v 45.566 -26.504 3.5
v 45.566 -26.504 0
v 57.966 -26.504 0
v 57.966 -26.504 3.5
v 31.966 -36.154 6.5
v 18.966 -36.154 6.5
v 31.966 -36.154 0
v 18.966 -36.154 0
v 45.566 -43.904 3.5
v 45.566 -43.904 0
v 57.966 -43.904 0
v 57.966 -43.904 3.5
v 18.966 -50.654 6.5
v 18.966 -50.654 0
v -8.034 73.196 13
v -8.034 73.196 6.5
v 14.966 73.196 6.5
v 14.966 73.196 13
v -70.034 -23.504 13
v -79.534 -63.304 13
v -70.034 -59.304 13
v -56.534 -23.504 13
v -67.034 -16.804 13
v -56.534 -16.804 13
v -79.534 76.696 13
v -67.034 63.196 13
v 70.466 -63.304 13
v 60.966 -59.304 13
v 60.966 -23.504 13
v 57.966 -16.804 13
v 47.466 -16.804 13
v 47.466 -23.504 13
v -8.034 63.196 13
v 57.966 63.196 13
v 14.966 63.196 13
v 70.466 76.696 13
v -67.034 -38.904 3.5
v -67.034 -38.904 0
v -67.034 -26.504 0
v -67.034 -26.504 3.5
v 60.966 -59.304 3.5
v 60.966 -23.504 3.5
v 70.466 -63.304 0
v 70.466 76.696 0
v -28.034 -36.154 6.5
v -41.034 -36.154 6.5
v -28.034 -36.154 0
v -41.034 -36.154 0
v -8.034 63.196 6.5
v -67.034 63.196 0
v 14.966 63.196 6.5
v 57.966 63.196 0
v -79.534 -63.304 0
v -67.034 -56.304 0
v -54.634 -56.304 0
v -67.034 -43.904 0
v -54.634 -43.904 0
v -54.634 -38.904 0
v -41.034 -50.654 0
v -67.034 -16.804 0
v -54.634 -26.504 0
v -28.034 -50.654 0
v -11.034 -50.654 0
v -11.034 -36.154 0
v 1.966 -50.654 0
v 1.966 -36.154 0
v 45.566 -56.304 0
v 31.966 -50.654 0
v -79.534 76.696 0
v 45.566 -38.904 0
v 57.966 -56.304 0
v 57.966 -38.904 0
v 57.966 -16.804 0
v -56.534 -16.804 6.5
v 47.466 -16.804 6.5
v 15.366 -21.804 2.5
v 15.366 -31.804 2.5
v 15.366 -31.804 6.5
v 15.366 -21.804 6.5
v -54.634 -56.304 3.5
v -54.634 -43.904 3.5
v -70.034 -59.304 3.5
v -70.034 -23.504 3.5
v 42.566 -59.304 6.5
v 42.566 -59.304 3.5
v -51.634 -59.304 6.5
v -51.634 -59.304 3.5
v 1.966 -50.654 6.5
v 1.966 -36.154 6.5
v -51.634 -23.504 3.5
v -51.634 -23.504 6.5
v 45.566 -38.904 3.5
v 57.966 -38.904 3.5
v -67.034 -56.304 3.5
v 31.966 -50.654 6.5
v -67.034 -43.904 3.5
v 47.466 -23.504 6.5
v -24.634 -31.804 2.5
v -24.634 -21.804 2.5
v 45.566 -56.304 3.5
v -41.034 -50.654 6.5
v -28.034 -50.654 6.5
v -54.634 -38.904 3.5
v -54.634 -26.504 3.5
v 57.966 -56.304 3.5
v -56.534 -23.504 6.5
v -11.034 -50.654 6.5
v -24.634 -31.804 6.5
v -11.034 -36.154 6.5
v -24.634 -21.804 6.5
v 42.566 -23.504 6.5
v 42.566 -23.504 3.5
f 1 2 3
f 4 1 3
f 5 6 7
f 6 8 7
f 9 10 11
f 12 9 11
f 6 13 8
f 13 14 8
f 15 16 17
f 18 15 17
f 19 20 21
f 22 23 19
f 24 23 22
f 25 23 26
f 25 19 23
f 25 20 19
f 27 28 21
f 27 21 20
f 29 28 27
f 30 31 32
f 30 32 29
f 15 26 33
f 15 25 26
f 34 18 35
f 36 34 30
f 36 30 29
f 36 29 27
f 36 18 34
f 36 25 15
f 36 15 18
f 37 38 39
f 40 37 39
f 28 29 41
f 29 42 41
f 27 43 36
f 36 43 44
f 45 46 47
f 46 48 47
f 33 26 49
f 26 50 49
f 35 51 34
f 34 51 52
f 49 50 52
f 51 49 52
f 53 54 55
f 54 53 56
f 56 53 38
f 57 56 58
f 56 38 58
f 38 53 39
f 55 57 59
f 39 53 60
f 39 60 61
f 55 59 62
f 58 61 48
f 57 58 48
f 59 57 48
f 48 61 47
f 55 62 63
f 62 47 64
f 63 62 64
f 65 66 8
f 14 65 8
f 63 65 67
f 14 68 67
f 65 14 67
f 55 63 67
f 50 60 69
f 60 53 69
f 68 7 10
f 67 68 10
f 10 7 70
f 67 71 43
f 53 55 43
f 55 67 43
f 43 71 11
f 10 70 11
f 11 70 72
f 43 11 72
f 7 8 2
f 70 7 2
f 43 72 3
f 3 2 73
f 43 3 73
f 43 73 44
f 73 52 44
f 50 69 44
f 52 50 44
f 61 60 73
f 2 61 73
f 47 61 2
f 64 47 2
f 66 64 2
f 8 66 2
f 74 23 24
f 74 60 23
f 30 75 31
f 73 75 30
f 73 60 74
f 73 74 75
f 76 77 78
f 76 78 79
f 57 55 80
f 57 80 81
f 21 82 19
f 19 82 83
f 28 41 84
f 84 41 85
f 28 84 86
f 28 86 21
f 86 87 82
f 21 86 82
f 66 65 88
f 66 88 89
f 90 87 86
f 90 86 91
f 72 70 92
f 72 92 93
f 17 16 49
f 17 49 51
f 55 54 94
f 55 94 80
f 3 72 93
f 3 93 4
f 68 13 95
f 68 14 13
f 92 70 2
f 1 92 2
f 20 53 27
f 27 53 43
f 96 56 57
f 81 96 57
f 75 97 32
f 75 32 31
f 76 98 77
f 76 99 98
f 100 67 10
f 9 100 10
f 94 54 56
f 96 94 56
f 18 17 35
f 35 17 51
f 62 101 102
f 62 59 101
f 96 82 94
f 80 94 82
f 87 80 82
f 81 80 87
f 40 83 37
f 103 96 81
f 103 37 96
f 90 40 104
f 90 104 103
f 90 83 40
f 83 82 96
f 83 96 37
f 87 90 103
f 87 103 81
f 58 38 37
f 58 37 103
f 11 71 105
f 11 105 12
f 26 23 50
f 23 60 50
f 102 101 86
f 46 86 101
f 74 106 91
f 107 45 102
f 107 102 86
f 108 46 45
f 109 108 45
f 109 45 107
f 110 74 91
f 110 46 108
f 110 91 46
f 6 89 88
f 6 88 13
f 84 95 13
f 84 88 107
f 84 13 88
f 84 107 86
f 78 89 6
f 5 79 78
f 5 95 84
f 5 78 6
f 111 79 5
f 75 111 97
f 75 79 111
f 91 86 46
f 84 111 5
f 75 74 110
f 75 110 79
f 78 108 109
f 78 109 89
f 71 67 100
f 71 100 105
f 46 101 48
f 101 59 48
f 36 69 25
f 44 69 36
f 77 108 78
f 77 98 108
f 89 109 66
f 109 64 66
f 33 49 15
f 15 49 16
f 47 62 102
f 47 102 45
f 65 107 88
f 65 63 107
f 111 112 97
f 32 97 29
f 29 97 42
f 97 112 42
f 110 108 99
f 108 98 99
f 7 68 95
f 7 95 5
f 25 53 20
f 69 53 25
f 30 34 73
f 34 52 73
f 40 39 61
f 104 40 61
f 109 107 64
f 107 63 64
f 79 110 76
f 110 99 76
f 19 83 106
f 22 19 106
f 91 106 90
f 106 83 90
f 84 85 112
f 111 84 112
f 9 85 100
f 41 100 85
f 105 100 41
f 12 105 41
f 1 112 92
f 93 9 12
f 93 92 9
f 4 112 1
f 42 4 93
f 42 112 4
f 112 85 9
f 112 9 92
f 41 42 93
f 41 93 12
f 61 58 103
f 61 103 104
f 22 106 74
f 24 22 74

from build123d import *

# Parameters (mm, degrees)
F0_W     = 150
F0_H     = 140
F0_W_2   = 18.4
F0_H_2   = 35.8
F0_W_3   = 13
F0_H_3   = 14.5
F0_W_4   = 40
F0_H_4   = 10
F0_W_5   = 22.4
F0_W_6   = 125
F0_H_5   = 80
F0_W_7   = 12.4
F0_H_6   = 12.4
F1_DEPTH = 2.5
F2_DEPTH = 3.5
F3_W     = 150
F3_H     = 140
F3_W_2   = 18.4
F3_H_2   = 35.8
F3_W_3   = 13
F3_H_3   = 14.5
F3_W_4   = 40
F3_H_4   = 10
F3_W_5   = 125
F3_H_5   = 80
F4_DEPTH = 3
F5_W     = 150
F5_H     = 140
F5_W_2   = 10.5
F5_H_2   = 6.7
F6_DEPTH = 6.5


with BuildPart() as f1:
    # F0 (on Top) → F1 (new body)
    with BuildSketch(Plane.XY):
        with Locations((-4.5338094234, 6.6955923945)):
            Rectangle(F0_W, F0_H)
        with Locations((-60.8338094234, -41.4044076055)):
            Rectangle(F0_W_2, F0_H_2, mode=Mode.SUBTRACT)
        with Locations((-34.5338094234, -43.4044076055)):
            Rectangle(F0_W_3, F0_H_3, mode=Mode.SUBTRACT)
        with Locations((-4.6338094234, -26.8044076055)):
            Rectangle(F0_W_4, F0_H_4, mode=Mode.SUBTRACT)
        with Locations((-4.5338094234, -43.4044076055)):
            Rectangle(F0_W_3, F0_H_3, mode=Mode.SUBTRACT)
        with Locations((25.4661905766, -43.4044076055)):
            Rectangle(F0_W_3, F0_H_3, mode=Mode.SUBTRACT)
        with Locations((51.7661905766, -41.4044076055)):
            Rectangle(F0_W_5, F0_H_2, mode=Mode.SUBTRACT)
        with Locations((-4.5338094234, 23.1955923945)):
            Rectangle(F0_W_6, F0_H_5, mode=Mode.SUBTRACT)
        with Locations((-60.8338094234, -41.4044076055)):
            Rectangle(F0_W_2, F0_H_2)
        with Locations((-60.8338094234, -50.1044076055)):
            Rectangle(F0_W_7, F0_H_6, mode=Mode.SUBTRACT)
        with Locations((-60.8338094234, -32.7044076055)):
            Rectangle(F0_W_7, F0_H_6, mode=Mode.SUBTRACT)
        with Locations((51.7661905766, -41.4044076055)):
            Rectangle(F0_W_5, F0_H_2)
        with Locations((51.7661905766, -50.1044076055)):
            Rectangle(F0_W_7, F0_H_6, mode=Mode.SUBTRACT)
        with Locations((51.7661905766, -32.7044076055)):
            Rectangle(F0_W_7, F0_H_6, mode=Mode.SUBTRACT)
        with Locations((-4.6338094234, -26.8044076055)):
            Rectangle(F0_W_4, F0_H_4)
    extrude(amount=F1_DEPTH)

    # F0 (on Top) → F2 (join)
    with BuildSketch(Plane.XY):
        with Locations((-4.5338094234, 6.6955923945)):
            Rectangle(F0_W, F0_H)
        with Locations((-60.8338094234, -41.4044076055)):
            Rectangle(F0_W_2, F0_H_2, mode=Mode.SUBTRACT)
        with Locations((-34.5338094234, -43.4044076055)):
            Rectangle(F0_W_3, F0_H_3, mode=Mode.SUBTRACT)
        with Locations((-4.6338094234, -26.8044076055)):
            Rectangle(F0_W_4, F0_H_4, mode=Mode.SUBTRACT)
        with Locations((-4.5338094234, -43.4044076055)):
            Rectangle(F0_W_3, F0_H_3, mode=Mode.SUBTRACT)
        with Locations((25.4661905766, -43.4044076055)):
            Rectangle(F0_W_3, F0_H_3, mode=Mode.SUBTRACT)
        with Locations((51.7661905766, -41.4044076055)):
            Rectangle(F0_W_5, F0_H_2, mode=Mode.SUBTRACT)
        with Locations((-4.5338094234, 23.1955923945)):
            Rectangle(F0_W_6, F0_H_5, mode=Mode.SUBTRACT)
        with Locations((-60.8338094234, -41.4044076055)):
            Rectangle(F0_W_2, F0_H_2)
        with Locations((-60.8338094234, -50.1044076055)):
            Rectangle(F0_W_7, F0_H_6, mode=Mode.SUBTRACT)
        with Locations((-60.8338094234, -32.7044076055)):
            Rectangle(F0_W_7, F0_H_6, mode=Mode.SUBTRACT)
        with Locations((51.7661905766, -41.4044076055)):
            Rectangle(F0_W_5, F0_H_2)
        with Locations((51.7661905766, -50.1044076055)):
            Rectangle(F0_W_7, F0_H_6, mode=Mode.SUBTRACT)
        with Locations((51.7661905766, -32.7044076055)):
            Rectangle(F0_W_7, F0_H_6, mode=Mode.SUBTRACT)
    extrude(amount=F2_DEPTH)

    # F3 (on face) → F4 (join)
    with BuildSketch(Plane.XY.offset(3.5)):
        with Locations((-4.5338094234, 6.6955923945)):
            Rectangle(F3_W, F3_H)
        with Locations((-60.8338094234, -41.4044076055)):
            Rectangle(F3_W_2, F3_H_2, mode=Mode.SUBTRACT)
        with Locations((-34.5338094234, -43.4044076055)):
            Rectangle(F3_W_3, F3_H_3, mode=Mode.SUBTRACT)
        with Locations((-4.6338094234, -26.8044076055)):
            Rectangle(F3_W_4, F3_H_4, mode=Mode.SUBTRACT)
        with Locations((-4.5338094234, -43.4044076055)):
            Rectangle(F3_W_3, F3_H_3, mode=Mode.SUBTRACT)
        with Locations((25.4661905766, -43.4044076055)):
            Rectangle(F3_W_3, F3_H_3, mode=Mode.SUBTRACT)
        with Locations((51.7661905766, -41.4044076055)):
            Rectangle(F3_W_2, F3_H_2, mode=Mode.SUBTRACT)
        with Locations((-4.5338094234, 23.1955923945)):
            Rectangle(F3_W_5, F3_H_5, mode=Mode.SUBTRACT)
    extrude(amount=F4_DEPTH)

    # F5 (on face) → F6 (join)
    with BuildSketch(Plane.XY.offset(6.5)):
        with Locations((-4.5338094234, 6.6955923945)):
            Rectangle(F5_W, F5_H)
        Polygon((-67.0338094234, -23.5044076055), (-67.0338094234, -16.8044076055), (-67.0338094234, 63.1955923945), (-8.0338094234, 63.1955923945), (-8.0338094234, 73.1955923945), (14.9661905766, 73.1955923945), (14.9661905766, 63.1955923945), (57.9661905766, 63.1955923945), (57.9661905766, -16.8044076055), (57.9661905766, -23.5044076055), (60.9661905766, -23.5044076055), (60.9661905766, -59.3044076055), (42.5661905766, -59.3044076055), (-51.6338094234, -59.3044076055), (-70.0338094234, -59.3044076055), (-70.0338094234, -23.5044076055), align=None, mode=Mode.SUBTRACT)
        with Locations((-61.7838094234, -20.1544076055)):
            Rectangle(F5_W_2, F5_H_2)
        with Locations((52.7161905766, -20.1544076055)):
            Rectangle(F5_W_2, F5_H_2)
    extrude(amount=F6_DEPTH)


solid = f1.part
